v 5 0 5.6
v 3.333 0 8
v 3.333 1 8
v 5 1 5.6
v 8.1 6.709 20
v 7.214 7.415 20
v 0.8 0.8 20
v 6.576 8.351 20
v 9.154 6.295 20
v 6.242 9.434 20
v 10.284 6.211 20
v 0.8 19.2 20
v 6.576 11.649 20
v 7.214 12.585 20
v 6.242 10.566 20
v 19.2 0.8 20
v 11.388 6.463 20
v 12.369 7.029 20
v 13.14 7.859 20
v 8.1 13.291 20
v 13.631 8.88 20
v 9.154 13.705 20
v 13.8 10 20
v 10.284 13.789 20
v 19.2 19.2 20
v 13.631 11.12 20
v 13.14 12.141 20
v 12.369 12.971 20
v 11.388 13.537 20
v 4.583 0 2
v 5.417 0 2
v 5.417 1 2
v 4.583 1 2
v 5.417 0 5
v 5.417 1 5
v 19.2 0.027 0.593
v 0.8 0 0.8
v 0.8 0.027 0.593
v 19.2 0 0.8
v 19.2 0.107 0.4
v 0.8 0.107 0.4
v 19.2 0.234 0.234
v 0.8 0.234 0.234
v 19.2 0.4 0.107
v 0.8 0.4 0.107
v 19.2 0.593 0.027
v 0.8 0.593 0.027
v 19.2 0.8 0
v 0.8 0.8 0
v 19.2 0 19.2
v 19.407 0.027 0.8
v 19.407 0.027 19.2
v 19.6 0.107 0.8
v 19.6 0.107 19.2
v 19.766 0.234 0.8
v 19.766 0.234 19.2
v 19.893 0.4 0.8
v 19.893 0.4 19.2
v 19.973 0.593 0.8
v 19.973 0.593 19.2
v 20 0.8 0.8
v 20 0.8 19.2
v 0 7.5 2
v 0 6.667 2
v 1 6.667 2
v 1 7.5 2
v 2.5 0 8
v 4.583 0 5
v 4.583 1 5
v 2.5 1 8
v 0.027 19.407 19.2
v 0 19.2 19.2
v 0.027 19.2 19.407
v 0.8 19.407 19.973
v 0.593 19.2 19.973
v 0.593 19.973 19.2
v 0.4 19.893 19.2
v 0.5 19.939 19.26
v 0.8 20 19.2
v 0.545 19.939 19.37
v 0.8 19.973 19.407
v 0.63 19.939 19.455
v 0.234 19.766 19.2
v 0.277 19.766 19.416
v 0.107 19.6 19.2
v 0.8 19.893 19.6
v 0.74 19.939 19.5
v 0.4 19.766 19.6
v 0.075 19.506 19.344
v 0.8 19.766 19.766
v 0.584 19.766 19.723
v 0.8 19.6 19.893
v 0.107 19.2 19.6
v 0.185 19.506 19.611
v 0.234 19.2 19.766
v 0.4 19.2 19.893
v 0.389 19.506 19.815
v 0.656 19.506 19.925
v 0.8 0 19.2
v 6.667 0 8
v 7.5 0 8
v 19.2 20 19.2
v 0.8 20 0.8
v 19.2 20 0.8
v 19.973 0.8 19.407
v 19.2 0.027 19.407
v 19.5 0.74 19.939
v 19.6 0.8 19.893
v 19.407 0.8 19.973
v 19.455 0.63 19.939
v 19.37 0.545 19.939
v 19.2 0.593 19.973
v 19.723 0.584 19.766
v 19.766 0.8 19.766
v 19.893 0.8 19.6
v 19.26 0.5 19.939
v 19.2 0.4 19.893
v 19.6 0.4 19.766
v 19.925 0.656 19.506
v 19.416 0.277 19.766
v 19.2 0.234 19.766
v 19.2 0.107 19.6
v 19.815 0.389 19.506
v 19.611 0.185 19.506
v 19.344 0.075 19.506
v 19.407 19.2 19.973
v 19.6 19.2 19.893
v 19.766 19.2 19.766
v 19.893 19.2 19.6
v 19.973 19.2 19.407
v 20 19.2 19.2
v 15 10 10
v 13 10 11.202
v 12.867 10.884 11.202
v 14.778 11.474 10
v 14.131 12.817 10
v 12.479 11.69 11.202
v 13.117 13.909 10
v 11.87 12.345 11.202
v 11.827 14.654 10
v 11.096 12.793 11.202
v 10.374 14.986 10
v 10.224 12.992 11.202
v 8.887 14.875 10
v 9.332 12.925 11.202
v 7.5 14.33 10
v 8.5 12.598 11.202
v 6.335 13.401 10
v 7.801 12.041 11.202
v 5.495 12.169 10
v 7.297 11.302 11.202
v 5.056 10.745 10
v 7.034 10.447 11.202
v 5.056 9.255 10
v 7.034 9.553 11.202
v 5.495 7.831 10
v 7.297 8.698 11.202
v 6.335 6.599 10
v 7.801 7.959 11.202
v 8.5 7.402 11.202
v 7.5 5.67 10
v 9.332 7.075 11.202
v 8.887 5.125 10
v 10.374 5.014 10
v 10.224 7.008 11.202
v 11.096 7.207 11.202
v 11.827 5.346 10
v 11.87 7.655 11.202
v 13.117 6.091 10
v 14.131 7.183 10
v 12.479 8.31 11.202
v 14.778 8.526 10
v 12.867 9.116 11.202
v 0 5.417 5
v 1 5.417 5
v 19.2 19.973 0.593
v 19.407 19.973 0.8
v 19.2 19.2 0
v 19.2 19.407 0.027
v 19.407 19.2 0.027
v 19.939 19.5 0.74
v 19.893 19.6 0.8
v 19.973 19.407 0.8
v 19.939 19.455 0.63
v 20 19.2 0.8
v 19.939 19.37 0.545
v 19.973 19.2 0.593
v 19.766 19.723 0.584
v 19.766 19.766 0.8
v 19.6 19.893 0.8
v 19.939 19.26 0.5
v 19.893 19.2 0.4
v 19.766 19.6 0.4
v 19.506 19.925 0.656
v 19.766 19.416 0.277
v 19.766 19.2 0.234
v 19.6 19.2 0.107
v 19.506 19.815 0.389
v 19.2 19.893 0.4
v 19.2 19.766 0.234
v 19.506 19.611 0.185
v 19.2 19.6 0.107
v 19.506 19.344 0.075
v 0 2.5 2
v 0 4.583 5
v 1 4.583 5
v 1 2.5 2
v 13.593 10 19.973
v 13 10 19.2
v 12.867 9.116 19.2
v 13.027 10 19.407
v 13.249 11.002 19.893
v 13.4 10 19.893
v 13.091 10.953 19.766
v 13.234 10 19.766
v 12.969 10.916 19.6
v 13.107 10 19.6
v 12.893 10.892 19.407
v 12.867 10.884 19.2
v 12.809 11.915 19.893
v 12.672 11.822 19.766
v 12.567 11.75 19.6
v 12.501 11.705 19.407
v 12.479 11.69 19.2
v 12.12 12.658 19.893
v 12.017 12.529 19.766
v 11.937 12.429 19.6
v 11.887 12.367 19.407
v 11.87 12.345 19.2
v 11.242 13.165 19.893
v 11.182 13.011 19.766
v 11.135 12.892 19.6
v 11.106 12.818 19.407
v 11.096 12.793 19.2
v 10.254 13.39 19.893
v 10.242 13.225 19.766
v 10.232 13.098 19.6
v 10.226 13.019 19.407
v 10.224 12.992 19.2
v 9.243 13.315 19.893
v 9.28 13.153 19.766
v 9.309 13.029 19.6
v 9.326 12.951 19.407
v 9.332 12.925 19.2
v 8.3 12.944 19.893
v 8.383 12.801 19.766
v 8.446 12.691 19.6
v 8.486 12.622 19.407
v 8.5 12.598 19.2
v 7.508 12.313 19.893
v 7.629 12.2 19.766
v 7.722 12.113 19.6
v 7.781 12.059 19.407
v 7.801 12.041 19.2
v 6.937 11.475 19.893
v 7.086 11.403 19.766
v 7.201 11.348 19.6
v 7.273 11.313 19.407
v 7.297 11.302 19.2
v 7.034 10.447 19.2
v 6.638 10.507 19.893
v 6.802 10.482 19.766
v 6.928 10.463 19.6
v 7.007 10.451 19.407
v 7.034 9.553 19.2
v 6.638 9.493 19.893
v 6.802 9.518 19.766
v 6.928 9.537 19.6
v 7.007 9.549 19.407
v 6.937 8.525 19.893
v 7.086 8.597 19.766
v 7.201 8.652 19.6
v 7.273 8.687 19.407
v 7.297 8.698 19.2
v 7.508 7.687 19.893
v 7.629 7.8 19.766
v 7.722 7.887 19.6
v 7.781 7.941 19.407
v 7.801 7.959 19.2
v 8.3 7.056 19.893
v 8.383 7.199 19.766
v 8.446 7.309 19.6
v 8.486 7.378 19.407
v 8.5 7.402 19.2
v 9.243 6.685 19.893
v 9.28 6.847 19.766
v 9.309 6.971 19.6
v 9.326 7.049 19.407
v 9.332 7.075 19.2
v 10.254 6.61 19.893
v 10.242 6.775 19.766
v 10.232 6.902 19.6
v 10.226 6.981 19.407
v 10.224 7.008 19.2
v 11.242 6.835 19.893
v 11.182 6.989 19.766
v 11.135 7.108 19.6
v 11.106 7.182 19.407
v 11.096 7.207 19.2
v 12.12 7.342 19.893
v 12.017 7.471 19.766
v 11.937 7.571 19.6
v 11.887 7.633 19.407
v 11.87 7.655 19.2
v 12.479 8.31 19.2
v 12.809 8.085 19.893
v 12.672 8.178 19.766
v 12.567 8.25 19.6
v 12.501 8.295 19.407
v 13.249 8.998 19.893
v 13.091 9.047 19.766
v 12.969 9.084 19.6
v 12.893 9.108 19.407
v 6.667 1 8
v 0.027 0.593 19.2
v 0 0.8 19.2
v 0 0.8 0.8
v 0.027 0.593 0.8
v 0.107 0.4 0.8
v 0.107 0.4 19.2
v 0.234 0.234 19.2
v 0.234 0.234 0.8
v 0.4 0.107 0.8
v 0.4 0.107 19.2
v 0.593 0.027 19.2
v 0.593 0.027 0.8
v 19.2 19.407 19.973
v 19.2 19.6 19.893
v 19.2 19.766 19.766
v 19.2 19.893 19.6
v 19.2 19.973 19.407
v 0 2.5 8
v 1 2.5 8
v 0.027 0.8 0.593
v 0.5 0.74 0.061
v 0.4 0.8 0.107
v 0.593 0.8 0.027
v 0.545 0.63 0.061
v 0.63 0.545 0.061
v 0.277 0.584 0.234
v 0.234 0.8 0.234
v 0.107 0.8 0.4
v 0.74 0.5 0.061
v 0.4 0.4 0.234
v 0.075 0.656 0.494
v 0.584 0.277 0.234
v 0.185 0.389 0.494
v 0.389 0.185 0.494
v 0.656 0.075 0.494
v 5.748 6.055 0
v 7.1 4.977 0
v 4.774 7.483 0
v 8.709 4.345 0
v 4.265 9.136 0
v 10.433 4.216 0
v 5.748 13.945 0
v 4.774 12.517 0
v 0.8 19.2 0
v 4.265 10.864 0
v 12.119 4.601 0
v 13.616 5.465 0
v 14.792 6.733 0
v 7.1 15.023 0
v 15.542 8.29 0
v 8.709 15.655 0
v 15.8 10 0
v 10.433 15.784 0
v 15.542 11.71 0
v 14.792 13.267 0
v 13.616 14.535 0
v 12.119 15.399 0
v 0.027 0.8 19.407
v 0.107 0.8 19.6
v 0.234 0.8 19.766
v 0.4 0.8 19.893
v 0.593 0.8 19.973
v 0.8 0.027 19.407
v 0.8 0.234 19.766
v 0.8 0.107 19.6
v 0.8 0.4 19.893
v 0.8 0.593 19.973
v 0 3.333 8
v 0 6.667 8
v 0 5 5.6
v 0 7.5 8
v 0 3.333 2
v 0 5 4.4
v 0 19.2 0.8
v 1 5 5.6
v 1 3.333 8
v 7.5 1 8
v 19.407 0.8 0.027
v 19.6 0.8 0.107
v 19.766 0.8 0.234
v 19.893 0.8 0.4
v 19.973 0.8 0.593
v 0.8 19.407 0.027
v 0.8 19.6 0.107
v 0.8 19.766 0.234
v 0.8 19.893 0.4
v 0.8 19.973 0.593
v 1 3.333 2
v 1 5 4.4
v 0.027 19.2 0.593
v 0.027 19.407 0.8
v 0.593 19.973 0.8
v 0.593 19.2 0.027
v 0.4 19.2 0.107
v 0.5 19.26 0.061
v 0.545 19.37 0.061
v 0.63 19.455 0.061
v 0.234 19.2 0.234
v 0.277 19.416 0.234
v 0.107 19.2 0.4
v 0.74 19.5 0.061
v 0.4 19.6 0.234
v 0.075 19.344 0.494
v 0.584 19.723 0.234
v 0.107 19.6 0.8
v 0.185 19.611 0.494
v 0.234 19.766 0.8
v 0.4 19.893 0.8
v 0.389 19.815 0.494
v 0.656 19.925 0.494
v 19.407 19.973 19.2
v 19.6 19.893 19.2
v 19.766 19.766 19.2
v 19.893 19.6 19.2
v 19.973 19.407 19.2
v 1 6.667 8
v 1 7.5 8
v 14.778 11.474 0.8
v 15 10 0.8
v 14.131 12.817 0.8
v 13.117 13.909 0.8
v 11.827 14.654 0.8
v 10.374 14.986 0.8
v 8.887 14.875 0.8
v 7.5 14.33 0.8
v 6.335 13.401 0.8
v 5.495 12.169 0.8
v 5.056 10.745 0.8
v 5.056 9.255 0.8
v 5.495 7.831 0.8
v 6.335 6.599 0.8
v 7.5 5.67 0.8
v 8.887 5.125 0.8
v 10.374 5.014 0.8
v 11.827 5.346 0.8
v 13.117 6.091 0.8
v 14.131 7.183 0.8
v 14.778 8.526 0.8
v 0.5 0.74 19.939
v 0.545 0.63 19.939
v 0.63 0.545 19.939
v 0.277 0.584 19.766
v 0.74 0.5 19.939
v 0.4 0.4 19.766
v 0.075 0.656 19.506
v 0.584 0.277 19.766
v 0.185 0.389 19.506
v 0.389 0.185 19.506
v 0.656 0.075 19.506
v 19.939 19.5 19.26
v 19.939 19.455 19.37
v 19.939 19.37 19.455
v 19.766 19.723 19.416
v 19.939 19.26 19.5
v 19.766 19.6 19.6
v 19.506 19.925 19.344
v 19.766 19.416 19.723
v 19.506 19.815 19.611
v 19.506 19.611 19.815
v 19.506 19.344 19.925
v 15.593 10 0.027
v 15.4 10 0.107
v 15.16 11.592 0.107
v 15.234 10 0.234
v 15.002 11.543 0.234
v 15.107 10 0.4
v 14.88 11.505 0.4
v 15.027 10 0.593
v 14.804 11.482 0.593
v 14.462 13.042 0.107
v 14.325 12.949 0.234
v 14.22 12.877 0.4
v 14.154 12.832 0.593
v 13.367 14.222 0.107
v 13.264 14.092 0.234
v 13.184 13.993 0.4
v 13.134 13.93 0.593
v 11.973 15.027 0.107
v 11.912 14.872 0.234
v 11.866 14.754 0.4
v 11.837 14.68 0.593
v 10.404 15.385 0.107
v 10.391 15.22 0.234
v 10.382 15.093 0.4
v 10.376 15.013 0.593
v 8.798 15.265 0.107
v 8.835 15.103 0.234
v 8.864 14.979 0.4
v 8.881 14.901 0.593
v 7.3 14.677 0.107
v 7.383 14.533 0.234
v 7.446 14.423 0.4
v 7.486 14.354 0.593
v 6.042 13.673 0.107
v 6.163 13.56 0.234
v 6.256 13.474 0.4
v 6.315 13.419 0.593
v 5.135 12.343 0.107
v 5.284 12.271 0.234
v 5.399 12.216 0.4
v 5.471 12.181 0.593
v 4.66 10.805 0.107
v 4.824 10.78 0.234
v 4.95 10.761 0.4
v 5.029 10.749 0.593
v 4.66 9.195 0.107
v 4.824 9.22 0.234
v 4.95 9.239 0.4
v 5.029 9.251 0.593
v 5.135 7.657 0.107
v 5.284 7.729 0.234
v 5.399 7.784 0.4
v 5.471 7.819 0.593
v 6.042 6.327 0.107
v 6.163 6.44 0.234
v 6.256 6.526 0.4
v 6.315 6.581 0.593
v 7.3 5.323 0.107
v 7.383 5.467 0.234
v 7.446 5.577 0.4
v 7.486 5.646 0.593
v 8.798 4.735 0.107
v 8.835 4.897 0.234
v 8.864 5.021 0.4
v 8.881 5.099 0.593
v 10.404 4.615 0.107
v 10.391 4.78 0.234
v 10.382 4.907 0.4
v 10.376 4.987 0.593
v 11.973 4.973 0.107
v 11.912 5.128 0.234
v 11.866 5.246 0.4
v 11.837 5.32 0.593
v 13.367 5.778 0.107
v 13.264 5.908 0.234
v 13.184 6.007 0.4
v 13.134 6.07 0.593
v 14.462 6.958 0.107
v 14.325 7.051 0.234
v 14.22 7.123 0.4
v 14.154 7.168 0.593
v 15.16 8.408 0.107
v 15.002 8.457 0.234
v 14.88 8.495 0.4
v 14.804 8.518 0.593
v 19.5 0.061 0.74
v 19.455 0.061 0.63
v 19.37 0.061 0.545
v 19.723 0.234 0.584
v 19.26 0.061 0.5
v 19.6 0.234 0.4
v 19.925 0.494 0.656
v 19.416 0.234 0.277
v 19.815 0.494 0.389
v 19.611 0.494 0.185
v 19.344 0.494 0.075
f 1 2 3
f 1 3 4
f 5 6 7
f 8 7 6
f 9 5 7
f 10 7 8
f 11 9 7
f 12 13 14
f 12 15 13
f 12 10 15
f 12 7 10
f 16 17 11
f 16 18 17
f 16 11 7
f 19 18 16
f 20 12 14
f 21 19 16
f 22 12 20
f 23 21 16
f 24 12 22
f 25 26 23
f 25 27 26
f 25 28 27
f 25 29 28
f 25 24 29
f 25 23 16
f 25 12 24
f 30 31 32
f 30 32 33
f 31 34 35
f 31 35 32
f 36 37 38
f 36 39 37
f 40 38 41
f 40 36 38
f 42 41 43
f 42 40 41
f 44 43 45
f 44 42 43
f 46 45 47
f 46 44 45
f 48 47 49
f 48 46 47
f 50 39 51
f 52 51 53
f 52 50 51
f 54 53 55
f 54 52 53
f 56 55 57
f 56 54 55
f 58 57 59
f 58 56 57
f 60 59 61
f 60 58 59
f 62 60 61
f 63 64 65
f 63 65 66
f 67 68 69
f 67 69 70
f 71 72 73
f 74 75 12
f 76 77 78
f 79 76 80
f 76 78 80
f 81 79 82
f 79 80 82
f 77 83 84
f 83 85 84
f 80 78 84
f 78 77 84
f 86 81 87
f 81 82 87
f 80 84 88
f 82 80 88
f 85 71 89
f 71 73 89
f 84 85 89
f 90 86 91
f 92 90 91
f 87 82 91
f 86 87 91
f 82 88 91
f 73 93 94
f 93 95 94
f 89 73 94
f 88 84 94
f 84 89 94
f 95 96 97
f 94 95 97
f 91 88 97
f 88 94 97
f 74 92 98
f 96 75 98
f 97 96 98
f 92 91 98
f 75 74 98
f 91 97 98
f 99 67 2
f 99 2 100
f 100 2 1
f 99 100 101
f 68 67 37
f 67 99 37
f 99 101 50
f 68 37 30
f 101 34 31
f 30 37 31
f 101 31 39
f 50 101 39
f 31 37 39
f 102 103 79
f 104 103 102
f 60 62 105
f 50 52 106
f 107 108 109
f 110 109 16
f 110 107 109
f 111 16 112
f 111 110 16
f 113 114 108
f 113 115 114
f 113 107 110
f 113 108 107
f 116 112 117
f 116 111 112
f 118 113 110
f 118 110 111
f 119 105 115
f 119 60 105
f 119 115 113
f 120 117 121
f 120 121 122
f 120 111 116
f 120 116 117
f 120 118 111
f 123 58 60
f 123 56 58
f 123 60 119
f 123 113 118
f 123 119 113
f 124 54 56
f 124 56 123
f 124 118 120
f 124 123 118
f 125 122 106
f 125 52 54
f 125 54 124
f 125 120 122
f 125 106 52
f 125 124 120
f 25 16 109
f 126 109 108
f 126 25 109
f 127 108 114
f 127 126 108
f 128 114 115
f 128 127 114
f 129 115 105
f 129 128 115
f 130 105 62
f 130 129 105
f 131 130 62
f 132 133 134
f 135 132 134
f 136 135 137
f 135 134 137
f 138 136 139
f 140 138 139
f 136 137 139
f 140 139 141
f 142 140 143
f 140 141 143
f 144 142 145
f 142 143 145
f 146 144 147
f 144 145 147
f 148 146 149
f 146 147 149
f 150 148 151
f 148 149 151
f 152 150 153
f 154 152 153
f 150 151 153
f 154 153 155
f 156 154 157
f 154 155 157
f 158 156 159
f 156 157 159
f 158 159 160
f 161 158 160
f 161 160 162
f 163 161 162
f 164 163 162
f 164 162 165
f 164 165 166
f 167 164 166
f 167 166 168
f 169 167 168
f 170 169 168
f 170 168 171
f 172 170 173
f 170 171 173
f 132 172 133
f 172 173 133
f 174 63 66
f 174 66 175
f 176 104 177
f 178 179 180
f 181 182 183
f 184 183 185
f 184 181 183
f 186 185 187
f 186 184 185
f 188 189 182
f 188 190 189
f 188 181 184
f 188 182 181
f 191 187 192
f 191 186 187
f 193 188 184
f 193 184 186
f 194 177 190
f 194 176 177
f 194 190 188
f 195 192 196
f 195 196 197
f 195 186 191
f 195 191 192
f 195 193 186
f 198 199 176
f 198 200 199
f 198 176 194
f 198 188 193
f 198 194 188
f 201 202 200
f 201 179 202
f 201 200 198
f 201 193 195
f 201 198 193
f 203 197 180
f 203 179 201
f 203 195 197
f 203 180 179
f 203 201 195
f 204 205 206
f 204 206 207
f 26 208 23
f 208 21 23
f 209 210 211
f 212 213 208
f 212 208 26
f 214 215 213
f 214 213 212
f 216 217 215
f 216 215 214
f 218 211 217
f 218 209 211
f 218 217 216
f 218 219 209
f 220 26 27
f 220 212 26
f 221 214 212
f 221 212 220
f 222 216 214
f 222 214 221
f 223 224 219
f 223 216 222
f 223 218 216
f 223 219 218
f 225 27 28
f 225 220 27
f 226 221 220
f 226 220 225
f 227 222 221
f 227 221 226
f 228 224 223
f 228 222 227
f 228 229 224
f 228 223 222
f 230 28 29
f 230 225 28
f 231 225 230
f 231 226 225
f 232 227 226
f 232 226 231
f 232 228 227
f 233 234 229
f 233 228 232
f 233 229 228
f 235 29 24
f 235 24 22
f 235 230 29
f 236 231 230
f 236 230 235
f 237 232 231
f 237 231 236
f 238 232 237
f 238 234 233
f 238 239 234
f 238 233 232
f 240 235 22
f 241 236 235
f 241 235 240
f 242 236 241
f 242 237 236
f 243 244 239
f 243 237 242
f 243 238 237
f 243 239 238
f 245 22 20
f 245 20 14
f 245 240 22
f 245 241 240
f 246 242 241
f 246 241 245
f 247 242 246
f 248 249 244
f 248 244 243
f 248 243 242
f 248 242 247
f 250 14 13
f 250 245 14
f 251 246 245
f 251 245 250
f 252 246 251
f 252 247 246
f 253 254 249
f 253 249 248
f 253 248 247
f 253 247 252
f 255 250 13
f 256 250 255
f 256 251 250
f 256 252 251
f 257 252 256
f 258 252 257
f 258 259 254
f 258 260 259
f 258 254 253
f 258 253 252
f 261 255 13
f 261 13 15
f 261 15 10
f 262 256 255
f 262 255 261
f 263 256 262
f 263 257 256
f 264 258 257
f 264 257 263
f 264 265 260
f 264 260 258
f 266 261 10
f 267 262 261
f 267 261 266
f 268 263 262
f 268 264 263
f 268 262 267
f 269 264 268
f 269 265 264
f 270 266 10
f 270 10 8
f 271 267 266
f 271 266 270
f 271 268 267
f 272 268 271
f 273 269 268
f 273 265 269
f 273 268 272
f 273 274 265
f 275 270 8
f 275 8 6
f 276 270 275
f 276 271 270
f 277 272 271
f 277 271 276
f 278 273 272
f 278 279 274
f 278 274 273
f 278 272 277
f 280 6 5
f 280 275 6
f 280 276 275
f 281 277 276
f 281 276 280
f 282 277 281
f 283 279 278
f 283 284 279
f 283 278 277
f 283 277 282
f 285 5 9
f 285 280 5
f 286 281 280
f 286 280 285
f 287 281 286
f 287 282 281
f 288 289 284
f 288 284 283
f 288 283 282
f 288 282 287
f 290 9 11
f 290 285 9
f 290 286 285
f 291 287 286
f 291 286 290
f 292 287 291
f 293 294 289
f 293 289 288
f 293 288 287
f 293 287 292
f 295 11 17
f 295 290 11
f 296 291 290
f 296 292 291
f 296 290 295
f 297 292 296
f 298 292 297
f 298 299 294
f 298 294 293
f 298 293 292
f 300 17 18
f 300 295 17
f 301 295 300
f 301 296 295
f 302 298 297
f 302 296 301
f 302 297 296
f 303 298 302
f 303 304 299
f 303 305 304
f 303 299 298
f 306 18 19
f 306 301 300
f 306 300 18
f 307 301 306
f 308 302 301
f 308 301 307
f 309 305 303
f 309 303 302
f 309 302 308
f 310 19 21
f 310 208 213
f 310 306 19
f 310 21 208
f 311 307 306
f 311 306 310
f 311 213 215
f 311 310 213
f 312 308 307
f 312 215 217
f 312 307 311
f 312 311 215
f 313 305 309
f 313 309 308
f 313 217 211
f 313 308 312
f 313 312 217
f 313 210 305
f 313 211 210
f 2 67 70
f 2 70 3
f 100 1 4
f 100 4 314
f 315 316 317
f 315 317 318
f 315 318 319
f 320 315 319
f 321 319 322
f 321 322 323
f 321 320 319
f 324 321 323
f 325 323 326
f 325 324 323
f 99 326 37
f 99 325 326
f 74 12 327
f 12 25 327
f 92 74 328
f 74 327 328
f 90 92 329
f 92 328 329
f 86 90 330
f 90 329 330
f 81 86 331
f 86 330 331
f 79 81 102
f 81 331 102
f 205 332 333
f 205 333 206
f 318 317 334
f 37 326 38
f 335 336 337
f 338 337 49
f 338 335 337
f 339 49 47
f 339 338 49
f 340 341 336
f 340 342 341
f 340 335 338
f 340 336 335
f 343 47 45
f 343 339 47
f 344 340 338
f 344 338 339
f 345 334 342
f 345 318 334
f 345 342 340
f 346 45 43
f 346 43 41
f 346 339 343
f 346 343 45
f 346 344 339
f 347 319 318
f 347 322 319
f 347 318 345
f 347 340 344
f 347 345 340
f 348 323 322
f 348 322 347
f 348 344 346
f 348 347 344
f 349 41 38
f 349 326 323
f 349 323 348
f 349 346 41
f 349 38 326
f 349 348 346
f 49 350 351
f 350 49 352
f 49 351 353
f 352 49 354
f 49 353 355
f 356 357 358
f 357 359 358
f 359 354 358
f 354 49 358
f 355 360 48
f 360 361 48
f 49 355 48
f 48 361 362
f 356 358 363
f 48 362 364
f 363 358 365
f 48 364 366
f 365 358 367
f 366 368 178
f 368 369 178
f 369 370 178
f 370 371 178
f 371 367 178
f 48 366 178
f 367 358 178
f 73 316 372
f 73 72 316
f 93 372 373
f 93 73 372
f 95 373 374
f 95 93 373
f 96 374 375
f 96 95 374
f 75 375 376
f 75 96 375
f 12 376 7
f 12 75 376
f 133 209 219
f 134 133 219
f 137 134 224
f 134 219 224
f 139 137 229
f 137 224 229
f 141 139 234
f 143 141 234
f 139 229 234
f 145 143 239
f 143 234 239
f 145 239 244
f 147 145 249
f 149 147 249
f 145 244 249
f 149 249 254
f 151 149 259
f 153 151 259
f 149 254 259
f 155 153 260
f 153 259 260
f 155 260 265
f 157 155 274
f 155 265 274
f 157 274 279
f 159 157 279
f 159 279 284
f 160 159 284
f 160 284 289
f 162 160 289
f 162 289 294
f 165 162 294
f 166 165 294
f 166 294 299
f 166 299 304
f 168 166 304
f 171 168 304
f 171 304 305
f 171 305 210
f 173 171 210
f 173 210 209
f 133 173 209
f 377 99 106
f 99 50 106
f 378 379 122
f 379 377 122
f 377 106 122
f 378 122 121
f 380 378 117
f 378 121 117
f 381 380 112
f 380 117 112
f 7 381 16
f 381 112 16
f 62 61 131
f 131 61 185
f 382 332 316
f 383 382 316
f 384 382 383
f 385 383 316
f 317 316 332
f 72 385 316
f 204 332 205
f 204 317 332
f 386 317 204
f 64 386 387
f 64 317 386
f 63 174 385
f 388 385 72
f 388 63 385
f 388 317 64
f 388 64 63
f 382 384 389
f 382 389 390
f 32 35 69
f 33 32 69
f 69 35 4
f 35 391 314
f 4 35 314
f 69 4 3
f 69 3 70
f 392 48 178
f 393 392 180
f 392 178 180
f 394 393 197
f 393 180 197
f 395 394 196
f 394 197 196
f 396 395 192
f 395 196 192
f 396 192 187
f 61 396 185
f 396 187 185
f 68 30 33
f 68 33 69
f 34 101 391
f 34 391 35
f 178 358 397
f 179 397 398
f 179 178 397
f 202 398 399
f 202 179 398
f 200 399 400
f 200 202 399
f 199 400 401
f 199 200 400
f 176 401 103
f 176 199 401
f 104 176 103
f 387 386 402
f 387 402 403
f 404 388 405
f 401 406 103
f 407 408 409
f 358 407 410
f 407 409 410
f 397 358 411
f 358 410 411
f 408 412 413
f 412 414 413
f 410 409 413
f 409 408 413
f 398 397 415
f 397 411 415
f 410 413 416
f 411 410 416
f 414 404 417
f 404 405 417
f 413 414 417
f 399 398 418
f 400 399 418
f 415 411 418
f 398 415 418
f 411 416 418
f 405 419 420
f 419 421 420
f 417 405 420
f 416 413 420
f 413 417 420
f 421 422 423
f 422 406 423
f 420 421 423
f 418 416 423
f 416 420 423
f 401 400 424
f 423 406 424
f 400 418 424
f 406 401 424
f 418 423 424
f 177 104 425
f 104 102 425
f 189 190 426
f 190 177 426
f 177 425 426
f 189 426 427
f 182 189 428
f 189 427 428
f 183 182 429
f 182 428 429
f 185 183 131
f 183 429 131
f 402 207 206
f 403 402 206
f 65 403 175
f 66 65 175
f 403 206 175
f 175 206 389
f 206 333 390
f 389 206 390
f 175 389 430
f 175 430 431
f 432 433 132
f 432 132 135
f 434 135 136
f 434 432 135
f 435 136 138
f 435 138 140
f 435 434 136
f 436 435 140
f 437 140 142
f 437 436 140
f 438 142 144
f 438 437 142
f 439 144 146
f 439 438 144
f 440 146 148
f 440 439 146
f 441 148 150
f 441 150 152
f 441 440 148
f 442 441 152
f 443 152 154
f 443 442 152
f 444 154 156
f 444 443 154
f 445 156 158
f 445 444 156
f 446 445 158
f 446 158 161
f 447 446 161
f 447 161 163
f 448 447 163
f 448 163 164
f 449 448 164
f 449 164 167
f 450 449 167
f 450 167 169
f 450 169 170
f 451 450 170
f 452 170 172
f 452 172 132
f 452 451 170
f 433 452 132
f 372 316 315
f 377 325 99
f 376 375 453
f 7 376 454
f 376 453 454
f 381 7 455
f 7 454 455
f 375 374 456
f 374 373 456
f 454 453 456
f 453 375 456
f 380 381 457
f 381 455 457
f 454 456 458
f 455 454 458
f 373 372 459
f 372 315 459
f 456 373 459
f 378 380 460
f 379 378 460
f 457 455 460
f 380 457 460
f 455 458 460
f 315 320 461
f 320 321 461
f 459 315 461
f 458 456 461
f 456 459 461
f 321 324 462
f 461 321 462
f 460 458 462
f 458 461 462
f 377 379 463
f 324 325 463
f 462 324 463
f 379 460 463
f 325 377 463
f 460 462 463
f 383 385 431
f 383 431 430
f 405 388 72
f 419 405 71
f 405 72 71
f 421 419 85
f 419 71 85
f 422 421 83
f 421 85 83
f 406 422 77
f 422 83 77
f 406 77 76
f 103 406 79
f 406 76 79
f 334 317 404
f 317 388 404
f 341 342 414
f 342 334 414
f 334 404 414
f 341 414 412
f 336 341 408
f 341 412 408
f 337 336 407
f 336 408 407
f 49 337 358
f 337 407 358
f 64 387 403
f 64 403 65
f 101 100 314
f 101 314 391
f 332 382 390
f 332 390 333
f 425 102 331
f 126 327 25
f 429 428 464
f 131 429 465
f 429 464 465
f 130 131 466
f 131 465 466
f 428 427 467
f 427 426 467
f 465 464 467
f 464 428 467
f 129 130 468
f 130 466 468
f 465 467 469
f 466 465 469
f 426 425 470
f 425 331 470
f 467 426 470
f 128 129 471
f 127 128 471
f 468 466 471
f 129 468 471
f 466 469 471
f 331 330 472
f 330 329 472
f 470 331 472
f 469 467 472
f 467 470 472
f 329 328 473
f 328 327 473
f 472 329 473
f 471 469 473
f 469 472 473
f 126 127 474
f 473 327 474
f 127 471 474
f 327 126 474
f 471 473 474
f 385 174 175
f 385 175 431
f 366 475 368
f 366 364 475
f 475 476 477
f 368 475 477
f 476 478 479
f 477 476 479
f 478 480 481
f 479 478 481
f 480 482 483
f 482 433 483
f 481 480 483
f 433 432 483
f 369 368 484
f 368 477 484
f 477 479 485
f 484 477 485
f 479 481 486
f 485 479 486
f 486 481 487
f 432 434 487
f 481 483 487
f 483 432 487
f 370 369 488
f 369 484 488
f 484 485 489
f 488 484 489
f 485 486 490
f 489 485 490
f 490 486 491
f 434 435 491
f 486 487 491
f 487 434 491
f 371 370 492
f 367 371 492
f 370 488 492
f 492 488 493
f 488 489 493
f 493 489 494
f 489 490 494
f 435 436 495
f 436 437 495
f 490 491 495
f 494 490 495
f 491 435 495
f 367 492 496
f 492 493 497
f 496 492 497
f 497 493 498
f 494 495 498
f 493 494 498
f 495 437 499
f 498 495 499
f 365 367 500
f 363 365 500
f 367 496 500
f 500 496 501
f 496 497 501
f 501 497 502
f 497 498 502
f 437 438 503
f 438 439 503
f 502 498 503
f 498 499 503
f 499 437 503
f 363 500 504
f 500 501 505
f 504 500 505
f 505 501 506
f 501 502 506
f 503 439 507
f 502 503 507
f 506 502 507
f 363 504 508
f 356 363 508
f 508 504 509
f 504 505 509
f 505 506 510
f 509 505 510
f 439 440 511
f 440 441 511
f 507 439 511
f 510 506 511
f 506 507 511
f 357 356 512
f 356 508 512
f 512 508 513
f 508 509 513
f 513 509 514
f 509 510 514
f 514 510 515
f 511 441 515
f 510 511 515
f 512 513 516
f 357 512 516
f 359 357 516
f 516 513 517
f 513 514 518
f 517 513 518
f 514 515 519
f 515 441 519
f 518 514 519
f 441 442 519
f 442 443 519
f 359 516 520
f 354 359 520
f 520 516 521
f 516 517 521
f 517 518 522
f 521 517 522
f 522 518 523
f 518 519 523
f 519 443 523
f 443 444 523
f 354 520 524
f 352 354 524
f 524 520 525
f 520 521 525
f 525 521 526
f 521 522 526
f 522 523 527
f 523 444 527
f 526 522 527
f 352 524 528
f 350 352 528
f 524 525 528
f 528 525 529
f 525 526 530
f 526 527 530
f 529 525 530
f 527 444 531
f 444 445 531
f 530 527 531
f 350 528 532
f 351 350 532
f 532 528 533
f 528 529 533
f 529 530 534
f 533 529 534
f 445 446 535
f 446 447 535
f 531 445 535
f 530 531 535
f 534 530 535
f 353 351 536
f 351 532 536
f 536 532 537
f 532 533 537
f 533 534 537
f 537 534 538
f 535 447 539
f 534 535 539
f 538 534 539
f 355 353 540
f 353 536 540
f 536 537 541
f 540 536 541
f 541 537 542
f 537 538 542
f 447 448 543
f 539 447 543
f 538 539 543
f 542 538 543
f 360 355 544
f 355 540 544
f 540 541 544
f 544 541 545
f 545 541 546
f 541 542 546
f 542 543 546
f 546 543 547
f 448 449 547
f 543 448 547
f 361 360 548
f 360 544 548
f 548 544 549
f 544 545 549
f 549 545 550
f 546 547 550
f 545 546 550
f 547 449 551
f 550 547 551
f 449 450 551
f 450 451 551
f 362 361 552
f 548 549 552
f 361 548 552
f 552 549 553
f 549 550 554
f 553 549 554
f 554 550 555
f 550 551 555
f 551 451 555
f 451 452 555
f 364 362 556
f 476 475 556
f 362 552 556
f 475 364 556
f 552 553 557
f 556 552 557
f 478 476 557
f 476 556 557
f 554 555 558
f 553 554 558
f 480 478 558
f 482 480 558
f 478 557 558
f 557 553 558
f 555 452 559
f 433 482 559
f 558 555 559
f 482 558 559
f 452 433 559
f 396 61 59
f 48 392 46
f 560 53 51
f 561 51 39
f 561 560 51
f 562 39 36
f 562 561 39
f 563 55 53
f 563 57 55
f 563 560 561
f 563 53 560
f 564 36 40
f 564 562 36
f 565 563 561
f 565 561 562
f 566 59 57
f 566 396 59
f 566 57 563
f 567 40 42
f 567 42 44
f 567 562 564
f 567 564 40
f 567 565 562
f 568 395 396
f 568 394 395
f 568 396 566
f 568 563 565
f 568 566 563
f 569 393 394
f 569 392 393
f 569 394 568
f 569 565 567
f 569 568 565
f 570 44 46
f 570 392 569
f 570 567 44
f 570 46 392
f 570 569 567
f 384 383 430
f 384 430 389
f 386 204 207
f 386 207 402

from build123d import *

# Parameters (mm, degrees)
SKETCH_W        = 20
SKETCH_H        = 20
PAD_DEPTH       = 20
POCKET_DEPTH    = 1
POCKET001_DEPTH = 1
SKETCH004_R     = 5
HOLE_DEPTH      = 10
HOLE_TIPS_R     = 5
SKETCH005_R     = 3
HOLE001_DEPTH   = 10
HOLE001_TIPS_R  = 3
FILLET_R        = 0.8
FILLET001_R     = 0.8


with BuildPart() as part:
    # Sketch → Pad (new body)
    with BuildSketch(Plane.XY):
        with Locations((10, 10)):
            Rectangle(SKETCH_W, SKETCH_H)
    extrude(amount=PAD_DEPTH)

    # Sketch002 → Pocket (cut)
    with BuildSketch(Plane.YZ):
        Polygon((7.5, 8), (6.666667, 8), (5, 5.6), (3.333333, 8), (2.5, 8), (4.583333, 5), (2.5, 2), (3.333333, 2), (5, 4.4), (6.666667, 2), (7.5, 2), (5.416667, 5), align=None)
    extrude(amount=POCKET_DEPTH, mode=Mode.SUBTRACT)

    # Sketch003 → Pocket001 (cut)
    with BuildSketch(Plane.XZ):
        Polygon((2.5, 8), (3.333333, 8), (5, 5.6), (6.666667, 8), (7.5, 8), (5.416667, 5), (5.416667, 2), (4.583333, 2), (4.583333, 5), align=None)
    extrude(amount=-POCKET001_DEPTH, mode=Mode.SUBTRACT)

    # Sketch004 → Hole (cut)
    with BuildSketch(Plane.XY):
        with Locations((10, 10)):
            Circle(SKETCH004_R)
    extrude(amount=HOLE_DEPTH, mode=Mode.SUBTRACT)

    # Hole tips → Hole tip 1 section 0
    with BuildSketch(Plane.XY.offset(10), mode=Mode.PRIVATE) as hole_tip_1_s0:
        with Locations((10, 10)):
            Circle(HOLE_TIPS_R)
    loft([hole_tip_1_s0.sketch, Vertex(10, 10, 13.004303)], mode=Mode.SUBTRACT)

    # Sketch005 (on DatumPlane) → Hole001 (cut)
    with BuildSketch(Plane.XY.offset(20)):
        with Locations((10, 10)):
            Circle(SKETCH005_R)
    extrude(amount=-HOLE001_DEPTH, mode=Mode.SUBTRACT)

    # Hole001 tips → Hole001 tip 1 section 0
    with BuildSketch(Plane.XY.offset(10), mode=Mode.PRIVATE) as hole001_tip_1_s0:
        with Locations((10, 10)):
            Circle(HOLE001_TIPS_R)
    loft([hole001_tip_1_s0.sketch, Vertex(10, 10, 8.197418)], mode=Mode.SUBTRACT)

    # Fillet
    fillet_edges = [part.edges().sort_by_distance(p)[0] for p in [
        (0, 0, 10),
        (0, 10, 20),
        (0, 20, 10),
        (10, 20, 20),
        (0, 10, 0),
        (10, 20, 0),
        (20, 20, 10),
        (20, 10, 0),
        (20, 0, 10),
        (10, 0, 0),
        (20, 10, 20),
        (10, 0, 20),
    ]]
    fillet(fillet_edges, radius=FILLET_R)

    # Fillet001
    fillet001_edges = [part.edges().sort_by_distance(p)[0] for p in [
        (7, 10, 20),
        (15, 10, 0),
    ]]
    fillet(fillet001_edges, radius=FILLET001_R)


solid = part.part
